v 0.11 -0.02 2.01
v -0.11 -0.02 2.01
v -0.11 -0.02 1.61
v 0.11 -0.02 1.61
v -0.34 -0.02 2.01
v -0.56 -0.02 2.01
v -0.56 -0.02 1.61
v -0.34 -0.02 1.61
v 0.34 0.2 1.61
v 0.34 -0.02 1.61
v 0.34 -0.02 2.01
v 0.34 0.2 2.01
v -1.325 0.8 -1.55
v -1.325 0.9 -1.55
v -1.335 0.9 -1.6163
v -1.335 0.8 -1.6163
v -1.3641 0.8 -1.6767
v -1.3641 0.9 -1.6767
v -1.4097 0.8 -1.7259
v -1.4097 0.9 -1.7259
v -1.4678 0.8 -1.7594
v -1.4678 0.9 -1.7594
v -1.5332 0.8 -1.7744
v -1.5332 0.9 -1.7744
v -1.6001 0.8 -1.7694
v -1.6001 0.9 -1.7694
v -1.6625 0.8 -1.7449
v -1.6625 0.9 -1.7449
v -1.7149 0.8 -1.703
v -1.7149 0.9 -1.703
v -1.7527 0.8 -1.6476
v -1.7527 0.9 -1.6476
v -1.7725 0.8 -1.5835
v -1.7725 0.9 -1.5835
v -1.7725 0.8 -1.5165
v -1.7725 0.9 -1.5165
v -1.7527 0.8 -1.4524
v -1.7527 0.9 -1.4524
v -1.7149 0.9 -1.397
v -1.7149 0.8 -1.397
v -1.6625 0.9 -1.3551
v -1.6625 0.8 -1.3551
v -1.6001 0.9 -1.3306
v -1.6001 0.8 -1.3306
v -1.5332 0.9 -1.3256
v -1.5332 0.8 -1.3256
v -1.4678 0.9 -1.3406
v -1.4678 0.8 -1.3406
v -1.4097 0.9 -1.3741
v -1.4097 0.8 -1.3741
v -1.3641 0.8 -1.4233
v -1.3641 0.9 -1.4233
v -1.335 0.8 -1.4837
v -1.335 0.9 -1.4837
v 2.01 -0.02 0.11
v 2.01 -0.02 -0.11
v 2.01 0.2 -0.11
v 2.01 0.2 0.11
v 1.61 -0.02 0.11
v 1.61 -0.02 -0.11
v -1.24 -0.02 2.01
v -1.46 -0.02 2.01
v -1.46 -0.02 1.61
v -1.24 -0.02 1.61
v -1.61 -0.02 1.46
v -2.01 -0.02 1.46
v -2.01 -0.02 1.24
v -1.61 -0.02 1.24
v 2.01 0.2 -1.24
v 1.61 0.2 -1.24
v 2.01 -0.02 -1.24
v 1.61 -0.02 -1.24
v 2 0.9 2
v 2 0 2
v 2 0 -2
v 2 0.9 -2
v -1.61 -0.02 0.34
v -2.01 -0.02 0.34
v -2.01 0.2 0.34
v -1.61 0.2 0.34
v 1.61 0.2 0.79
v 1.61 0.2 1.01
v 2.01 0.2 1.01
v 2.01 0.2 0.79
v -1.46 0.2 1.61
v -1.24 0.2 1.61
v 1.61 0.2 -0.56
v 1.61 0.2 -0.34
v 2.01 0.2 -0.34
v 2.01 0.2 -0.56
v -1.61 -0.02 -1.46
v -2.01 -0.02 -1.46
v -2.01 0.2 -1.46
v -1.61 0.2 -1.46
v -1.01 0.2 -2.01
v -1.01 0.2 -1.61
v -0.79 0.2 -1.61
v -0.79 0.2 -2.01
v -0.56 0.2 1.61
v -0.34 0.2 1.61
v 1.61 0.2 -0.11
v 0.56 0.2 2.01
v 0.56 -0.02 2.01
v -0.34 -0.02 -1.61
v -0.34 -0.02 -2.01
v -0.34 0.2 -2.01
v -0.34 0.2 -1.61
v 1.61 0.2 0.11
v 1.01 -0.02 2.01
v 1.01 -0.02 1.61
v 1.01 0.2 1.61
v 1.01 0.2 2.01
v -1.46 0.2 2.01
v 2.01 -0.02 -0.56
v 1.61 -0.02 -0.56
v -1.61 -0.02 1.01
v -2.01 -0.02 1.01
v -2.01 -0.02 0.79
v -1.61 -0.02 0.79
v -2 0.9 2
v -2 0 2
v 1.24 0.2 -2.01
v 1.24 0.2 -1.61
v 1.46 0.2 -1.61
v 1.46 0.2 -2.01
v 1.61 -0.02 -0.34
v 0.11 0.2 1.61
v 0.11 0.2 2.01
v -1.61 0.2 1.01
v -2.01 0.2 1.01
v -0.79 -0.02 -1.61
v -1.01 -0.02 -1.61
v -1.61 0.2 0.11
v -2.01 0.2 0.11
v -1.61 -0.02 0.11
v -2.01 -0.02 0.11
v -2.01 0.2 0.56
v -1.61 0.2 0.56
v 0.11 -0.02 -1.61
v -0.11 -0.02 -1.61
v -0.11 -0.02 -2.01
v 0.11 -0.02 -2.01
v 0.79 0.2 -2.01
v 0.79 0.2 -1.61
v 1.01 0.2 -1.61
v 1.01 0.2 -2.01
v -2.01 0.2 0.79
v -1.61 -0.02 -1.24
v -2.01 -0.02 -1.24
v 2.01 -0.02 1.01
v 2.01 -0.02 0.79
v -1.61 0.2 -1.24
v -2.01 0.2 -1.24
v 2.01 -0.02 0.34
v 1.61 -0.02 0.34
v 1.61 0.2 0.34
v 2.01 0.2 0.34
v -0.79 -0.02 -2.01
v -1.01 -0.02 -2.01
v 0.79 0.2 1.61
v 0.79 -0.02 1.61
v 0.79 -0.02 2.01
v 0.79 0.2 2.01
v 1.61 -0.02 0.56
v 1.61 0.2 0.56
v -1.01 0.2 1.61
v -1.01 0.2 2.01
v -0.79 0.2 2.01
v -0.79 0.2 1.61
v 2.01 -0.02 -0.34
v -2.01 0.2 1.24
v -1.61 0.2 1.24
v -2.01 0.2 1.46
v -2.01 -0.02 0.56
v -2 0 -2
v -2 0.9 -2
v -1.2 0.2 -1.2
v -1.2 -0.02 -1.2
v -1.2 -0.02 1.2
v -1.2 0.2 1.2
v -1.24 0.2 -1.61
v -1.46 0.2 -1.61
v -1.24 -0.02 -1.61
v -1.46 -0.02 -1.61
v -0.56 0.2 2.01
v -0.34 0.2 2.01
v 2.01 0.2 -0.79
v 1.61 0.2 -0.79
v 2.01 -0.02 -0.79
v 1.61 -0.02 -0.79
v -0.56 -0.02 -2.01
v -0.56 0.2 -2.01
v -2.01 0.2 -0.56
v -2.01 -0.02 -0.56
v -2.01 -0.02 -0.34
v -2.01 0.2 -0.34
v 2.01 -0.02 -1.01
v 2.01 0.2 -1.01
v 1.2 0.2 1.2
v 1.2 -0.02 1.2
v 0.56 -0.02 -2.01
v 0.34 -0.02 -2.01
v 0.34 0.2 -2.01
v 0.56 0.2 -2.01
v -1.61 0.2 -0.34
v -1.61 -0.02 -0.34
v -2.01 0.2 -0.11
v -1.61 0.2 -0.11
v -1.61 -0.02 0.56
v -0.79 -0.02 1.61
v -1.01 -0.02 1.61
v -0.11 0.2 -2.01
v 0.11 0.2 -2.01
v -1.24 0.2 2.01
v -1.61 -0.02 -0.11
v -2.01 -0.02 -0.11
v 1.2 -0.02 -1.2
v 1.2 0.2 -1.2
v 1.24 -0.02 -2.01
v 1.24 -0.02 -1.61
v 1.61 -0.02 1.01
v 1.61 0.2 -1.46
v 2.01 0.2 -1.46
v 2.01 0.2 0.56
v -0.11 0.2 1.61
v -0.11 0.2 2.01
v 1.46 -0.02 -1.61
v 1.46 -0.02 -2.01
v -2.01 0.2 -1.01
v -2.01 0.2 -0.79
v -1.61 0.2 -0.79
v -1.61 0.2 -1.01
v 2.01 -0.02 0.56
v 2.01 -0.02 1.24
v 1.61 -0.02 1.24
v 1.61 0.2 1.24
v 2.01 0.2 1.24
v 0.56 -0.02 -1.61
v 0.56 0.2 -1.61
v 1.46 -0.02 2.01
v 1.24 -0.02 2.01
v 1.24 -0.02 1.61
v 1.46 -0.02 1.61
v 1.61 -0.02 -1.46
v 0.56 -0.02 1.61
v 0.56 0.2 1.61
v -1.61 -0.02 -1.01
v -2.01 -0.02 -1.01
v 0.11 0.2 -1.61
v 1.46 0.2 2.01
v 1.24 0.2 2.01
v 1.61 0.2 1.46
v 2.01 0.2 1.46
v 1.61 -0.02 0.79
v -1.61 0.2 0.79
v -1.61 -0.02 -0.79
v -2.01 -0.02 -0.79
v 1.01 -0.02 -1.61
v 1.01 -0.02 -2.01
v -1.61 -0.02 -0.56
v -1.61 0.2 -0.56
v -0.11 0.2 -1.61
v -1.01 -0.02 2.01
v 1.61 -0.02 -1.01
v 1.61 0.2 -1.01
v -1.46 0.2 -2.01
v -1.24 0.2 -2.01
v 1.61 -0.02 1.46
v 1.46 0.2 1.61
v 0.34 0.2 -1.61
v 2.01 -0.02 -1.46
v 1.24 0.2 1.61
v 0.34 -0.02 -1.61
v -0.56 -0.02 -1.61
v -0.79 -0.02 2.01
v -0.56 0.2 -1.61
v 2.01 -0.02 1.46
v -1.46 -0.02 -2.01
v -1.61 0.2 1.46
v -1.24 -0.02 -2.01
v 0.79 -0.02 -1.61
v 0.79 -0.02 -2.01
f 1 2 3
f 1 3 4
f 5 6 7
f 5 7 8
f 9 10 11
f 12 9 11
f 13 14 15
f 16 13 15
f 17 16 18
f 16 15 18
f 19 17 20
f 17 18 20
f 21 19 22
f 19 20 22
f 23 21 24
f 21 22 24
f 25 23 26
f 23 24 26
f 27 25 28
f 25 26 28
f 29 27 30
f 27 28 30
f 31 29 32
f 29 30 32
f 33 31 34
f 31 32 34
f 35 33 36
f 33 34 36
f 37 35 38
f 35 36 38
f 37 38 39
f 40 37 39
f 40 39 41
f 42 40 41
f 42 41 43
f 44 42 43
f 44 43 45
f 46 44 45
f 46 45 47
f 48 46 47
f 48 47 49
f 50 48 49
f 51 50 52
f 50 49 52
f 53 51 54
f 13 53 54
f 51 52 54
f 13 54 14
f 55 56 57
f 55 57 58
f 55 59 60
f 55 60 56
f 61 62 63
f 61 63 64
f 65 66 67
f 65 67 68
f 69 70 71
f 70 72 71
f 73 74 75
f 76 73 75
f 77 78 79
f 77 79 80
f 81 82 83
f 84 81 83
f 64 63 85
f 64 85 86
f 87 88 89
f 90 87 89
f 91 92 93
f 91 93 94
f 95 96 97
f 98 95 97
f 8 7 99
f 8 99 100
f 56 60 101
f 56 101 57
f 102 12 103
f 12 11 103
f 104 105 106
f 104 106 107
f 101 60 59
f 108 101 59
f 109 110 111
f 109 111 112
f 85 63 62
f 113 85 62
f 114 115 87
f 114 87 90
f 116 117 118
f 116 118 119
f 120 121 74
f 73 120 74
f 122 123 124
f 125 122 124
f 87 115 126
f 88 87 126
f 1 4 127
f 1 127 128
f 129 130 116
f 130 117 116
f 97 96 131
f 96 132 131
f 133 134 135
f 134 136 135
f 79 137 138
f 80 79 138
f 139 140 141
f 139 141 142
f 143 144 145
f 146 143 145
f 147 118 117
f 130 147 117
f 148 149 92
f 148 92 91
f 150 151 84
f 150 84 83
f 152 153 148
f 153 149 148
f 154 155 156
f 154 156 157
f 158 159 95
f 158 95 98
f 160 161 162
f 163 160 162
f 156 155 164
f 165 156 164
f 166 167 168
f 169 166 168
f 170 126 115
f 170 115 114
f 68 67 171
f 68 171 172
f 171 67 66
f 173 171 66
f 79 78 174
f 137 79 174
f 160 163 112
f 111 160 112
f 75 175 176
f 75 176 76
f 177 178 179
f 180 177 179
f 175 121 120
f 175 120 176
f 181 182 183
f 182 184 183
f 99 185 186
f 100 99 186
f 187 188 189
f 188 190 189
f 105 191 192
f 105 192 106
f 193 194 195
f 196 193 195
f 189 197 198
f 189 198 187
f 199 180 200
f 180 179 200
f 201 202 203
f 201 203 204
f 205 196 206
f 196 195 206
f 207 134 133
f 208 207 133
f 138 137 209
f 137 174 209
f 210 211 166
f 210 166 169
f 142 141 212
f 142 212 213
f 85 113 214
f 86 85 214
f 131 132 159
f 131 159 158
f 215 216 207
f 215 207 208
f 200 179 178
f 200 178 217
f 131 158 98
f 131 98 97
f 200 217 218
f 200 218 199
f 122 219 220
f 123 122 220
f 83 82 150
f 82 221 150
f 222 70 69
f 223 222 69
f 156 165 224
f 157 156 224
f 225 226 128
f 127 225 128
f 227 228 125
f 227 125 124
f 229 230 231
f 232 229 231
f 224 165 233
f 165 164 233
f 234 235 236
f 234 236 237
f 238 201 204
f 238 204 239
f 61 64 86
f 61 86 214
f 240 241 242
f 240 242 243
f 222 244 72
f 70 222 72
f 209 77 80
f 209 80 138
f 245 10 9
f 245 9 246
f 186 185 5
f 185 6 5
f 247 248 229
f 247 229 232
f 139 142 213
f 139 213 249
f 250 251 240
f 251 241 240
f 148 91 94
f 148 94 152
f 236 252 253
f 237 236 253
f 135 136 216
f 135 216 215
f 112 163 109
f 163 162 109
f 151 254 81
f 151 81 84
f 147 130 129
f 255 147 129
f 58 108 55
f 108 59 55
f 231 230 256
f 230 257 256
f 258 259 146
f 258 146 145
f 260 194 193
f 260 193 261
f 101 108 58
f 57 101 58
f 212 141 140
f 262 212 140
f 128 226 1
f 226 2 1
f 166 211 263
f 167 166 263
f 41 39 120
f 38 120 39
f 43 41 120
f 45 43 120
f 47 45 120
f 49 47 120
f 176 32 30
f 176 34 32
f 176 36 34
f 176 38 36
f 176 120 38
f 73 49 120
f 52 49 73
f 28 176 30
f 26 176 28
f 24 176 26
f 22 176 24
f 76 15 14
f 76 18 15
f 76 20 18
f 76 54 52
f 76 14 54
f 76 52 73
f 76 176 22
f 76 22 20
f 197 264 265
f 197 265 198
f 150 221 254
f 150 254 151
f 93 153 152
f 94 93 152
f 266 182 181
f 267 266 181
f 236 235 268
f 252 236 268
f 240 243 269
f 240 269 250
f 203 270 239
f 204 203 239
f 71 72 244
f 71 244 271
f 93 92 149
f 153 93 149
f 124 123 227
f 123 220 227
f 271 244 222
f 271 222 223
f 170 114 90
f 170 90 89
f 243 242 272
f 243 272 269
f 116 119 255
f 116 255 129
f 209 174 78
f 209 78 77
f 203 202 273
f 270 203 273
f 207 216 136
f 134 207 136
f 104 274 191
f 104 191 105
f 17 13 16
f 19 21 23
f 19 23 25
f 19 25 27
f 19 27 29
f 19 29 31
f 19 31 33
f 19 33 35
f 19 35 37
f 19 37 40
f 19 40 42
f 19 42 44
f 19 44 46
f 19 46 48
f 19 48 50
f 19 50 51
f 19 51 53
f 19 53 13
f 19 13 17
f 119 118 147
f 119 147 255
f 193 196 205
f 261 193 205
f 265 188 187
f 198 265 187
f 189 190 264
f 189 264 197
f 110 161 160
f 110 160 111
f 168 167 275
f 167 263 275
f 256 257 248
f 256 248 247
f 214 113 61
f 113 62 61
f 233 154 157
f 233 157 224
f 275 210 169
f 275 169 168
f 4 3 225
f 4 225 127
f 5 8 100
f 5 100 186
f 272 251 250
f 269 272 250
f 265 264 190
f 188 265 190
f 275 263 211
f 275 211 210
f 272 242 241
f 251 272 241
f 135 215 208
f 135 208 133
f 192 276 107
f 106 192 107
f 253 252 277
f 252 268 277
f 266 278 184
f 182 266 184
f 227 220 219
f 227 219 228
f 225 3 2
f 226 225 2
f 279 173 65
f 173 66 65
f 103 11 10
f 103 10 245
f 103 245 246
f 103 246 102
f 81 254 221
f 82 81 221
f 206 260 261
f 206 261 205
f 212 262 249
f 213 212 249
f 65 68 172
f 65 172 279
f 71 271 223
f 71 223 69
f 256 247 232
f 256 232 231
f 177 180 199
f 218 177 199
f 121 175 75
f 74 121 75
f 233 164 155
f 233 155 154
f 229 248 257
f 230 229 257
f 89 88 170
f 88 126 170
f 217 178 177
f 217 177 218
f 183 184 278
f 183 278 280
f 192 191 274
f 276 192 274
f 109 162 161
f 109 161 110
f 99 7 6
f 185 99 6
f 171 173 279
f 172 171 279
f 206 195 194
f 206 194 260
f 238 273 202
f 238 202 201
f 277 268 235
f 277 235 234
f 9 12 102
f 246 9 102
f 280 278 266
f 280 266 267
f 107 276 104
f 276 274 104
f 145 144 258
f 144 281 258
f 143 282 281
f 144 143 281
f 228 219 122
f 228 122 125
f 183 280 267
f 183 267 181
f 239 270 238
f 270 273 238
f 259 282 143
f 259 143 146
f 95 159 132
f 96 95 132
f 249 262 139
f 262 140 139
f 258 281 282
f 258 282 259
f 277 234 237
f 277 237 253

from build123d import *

# Parameters (mm, degrees)
SKETCH2_W                   = 4
SKETCH2_H                   = 4
BOSS_EXTRUDE1_DEPTH         = 0.9
SKETCH3_W                   = 2.4
SKETCH3_H                   = 2.4
BOSS_EXTRUDE2_DEPTH         = 0.02
BOSS_EXTRUDE2_DEPTH_BACK    = 0.2
SKETCH3_W_2                 = 0.4
SKETCH3_H_2                 = 0.22
BOSS_EXTRUDE2_2_DEPTH       = 0.02
BOSS_EXTRUDE2_2_DEPTH_BACK  = 0.2
BOSS_EXTRUDE2_3_DEPTH       = 0.02
BOSS_EXTRUDE2_3_DEPTH_BACK  = 0.2
BOSS_EXTRUDE2_4_DEPTH       = 0.02
BOSS_EXTRUDE2_4_DEPTH_BACK  = 0.2
BOSS_EXTRUDE2_5_DEPTH       = 0.02
BOSS_EXTRUDE2_5_DEPTH_BACK  = 0.2
BOSS_EXTRUDE2_6_DEPTH       = 0.02
BOSS_EXTRUDE2_6_DEPTH_BACK  = 0.2
BOSS_EXTRUDE2_7_DEPTH       = 0.02
BOSS_EXTRUDE2_7_DEPTH_BACK  = 0.2
BOSS_EXTRUDE2_8_DEPTH       = 0.02
BOSS_EXTRUDE2_8_DEPTH_BACK  = 0.2
SKETCH3_W_3                 = 0.22
SKETCH3_H_3                 = 0.4
BOSS_EXTRUDE2_9_DEPTH       = 0.02
BOSS_EXTRUDE2_9_DEPTH_BACK  = 0.2
BOSS_EXTRUDE2_10_DEPTH      = 0.02
BOSS_EXTRUDE2_10_DEPTH_BACK = 0.2
BOSS_EXTRUDE2_11_DEPTH      = 0.02
BOSS_EXTRUDE2_11_DEPTH_BACK = 0.2
BOSS_EXTRUDE2_12_DEPTH      = 0.02
BOSS_EXTRUDE2_12_DEPTH_BACK = 0.2
BOSS_EXTRUDE2_13_DEPTH      = 0.02
BOSS_EXTRUDE2_13_DEPTH_BACK = 0.2
BOSS_EXTRUDE2_14_DEPTH      = 0.02
BOSS_EXTRUDE2_14_DEPTH_BACK = 0.2
BOSS_EXTRUDE2_15_DEPTH      = 0.02
BOSS_EXTRUDE2_15_DEPTH_BACK = 0.2
BOSS_EXTRUDE2_16_DEPTH      = 0.02
BOSS_EXTRUDE2_16_DEPTH_BACK = 0.2
BOSS_EXTRUDE2_17_DEPTH      = 0.02
BOSS_EXTRUDE2_17_DEPTH_BACK = 0.2
BOSS_EXTRUDE2_18_DEPTH      = 0.02
BOSS_EXTRUDE2_18_DEPTH_BACK = 0.2
BOSS_EXTRUDE2_19_DEPTH      = 0.02
BOSS_EXTRUDE2_19_DEPTH_BACK = 0.2
BOSS_EXTRUDE2_20_DEPTH      = 0.02
BOSS_EXTRUDE2_20_DEPTH_BACK = 0.2
BOSS_EXTRUDE2_21_DEPTH      = 0.02
BOSS_EXTRUDE2_21_DEPTH_BACK = 0.2
BOSS_EXTRUDE2_22_DEPTH      = 0.02
BOSS_EXTRUDE2_22_DEPTH_BACK = 0.2
BOSS_EXTRUDE2_23_DEPTH      = 0.02
BOSS_EXTRUDE2_23_DEPTH_BACK = 0.2
BOSS_EXTRUDE2_24_DEPTH      = 0.02
BOSS_EXTRUDE2_24_DEPTH_BACK = 0.2
BOSS_EXTRUDE2_25_DEPTH      = 0.02
BOSS_EXTRUDE2_25_DEPTH_BACK = 0.2
BOSS_EXTRUDE2_26_DEPTH      = 0.02
BOSS_EXTRUDE2_26_DEPTH_BACK = 0.2
BOSS_EXTRUDE2_27_DEPTH      = 0.02
BOSS_EXTRUDE2_27_DEPTH_BACK = 0.2
BOSS_EXTRUDE2_28_DEPTH      = 0.02
BOSS_EXTRUDE2_28_DEPTH_BACK = 0.2
BOSS_EXTRUDE2_29_DEPTH      = 0.02
BOSS_EXTRUDE2_29_DEPTH_BACK = 0.2
SKETCH4_R                   = 0.225
CUT_EXTRUDE1_DEPTH          = 0.1


with BuildPart() as part:
    # Sketch2 → Boss-Extrude1 (new body)
    with BuildSketch(Plane(origin=(0, 0, 0), x_dir=(1, 0, 0), z_dir=(0, 1, 0))):
        Rectangle(SKETCH2_W, SKETCH2_H)
    extrude(amount=BOSS_EXTRUDE1_DEPTH)

    # Sketch4 → Cut-Extrude1 (cut)
    with BuildSketch(Plane(origin=(0, 0.9, 0), x_dir=(1, 0, 0), z_dir=(0, 1, 0))):
        with Locations((-1.55, 1.55)):
            Circle(SKETCH4_R)
    extrude(amount=-CUT_EXTRUDE1_DEPTH, mode=Mode.SUBTRACT)


with BuildPart() as body_2:
    # Sketch3 → Boss-Extrude2 (new body, two sides)
    with BuildSketch(Plane.XZ) as boss_extrude2_sk:
        Rectangle(SKETCH3_W, SKETCH3_H)
    extrude(amount=BOSS_EXTRUDE2_DEPTH)
    extrude(boss_extrude2_sk.sketch, amount=-BOSS_EXTRUDE2_DEPTH_BACK)


with BuildPart() as body_3:
    # Sketch3 → Boss-Extrude2 2 (new body, two sides)
    with BuildSketch(Plane.XZ) as boss_extrude2_2_sk:
        with Locations((-1.81, 0.45)):
            Rectangle(SKETCH3_W_2, SKETCH3_H_2)
    extrude(amount=BOSS_EXTRUDE2_2_DEPTH)
    extrude(boss_extrude2_2_sk.sketch, amount=-BOSS_EXTRUDE2_2_DEPTH_BACK)


with BuildPart() as body_4:
    # Sketch3 → Boss-Extrude2 3 (new body, two sides)
    with BuildSketch(Plane.XZ) as boss_extrude2_3_sk:
        with Locations((-1.81, 0)):
            Rectangle(SKETCH3_W_2, SKETCH3_H_2)
    extrude(amount=BOSS_EXTRUDE2_3_DEPTH)
    extrude(boss_extrude2_3_sk.sketch, amount=-BOSS_EXTRUDE2_3_DEPTH_BACK)


with BuildPart() as body_5:
    # Sketch3 → Boss-Extrude2 4 (new body, two sides)
    with BuildSketch(Plane.XZ) as boss_extrude2_4_sk:
        with Locations((-1.81, 0.9)):
            Rectangle(SKETCH3_W_2, SKETCH3_H_2)
    extrude(amount=BOSS_EXTRUDE2_4_DEPTH)
    extrude(boss_extrude2_4_sk.sketch, amount=-BOSS_EXTRUDE2_4_DEPTH_BACK)


with BuildPart() as body_6:
    # Sketch3 → Boss-Extrude2 5 (new body, two sides)
    with BuildSketch(Plane.XZ) as boss_extrude2_5_sk:
        with Locations((-1.81, 1.35)):
            Rectangle(SKETCH3_W_2, SKETCH3_H_2)
    extrude(amount=BOSS_EXTRUDE2_5_DEPTH)
    extrude(boss_extrude2_5_sk.sketch, amount=-BOSS_EXTRUDE2_5_DEPTH_BACK)


with BuildPart() as body_7:
    # Sketch3 → Boss-Extrude2 6 (new body, two sides)
    with BuildSketch(Plane.XZ) as boss_extrude2_6_sk:
        with Locations((-1.81, -0.45)):
            Rectangle(SKETCH3_W_2, SKETCH3_H_2)
    extrude(amount=BOSS_EXTRUDE2_6_DEPTH)
    extrude(boss_extrude2_6_sk.sketch, amount=-BOSS_EXTRUDE2_6_DEPTH_BACK)


with BuildPart() as body_8:
    # Sketch3 → Boss-Extrude2 7 (new body, two sides)
    with BuildSketch(Plane.XZ) as boss_extrude2_7_sk:
        with Locations((-1.81, -0.9)):
            Rectangle(SKETCH3_W_2, SKETCH3_H_2)
    extrude(amount=BOSS_EXTRUDE2_7_DEPTH)
    extrude(boss_extrude2_7_sk.sketch, amount=-BOSS_EXTRUDE2_7_DEPTH_BACK)


with BuildPart() as body_9:
    # Sketch3 → Boss-Extrude2 8 (new body, two sides)
    with BuildSketch(Plane.XZ) as boss_extrude2_8_sk:
        with Locations((-1.81, -1.35)):
            Rectangle(SKETCH3_W_2, SKETCH3_H_2)
    extrude(amount=BOSS_EXTRUDE2_8_DEPTH)
    extrude(boss_extrude2_8_sk.sketch, amount=-BOSS_EXTRUDE2_8_DEPTH_BACK)


with BuildPart() as body_10:
    # Sketch3 → Boss-Extrude2 9 (new body, two sides)
    with BuildSketch(Plane.XZ) as boss_extrude2_9_sk:
        with Locations((0.45, 1.81)):
            Rectangle(SKETCH3_W_3, SKETCH3_H_3)
    extrude(amount=BOSS_EXTRUDE2_9_DEPTH)
    extrude(boss_extrude2_9_sk.sketch, amount=-BOSS_EXTRUDE2_9_DEPTH_BACK)


with BuildPart() as body_11:
    # Sketch3 → Boss-Extrude2 10 (new body, two sides)
    with BuildSketch(Plane.XZ) as boss_extrude2_10_sk:
        with Locations((0, 1.81)):
            Rectangle(SKETCH3_W_3, SKETCH3_H_3)
    extrude(amount=BOSS_EXTRUDE2_10_DEPTH)
    extrude(boss_extrude2_10_sk.sketch, amount=-BOSS_EXTRUDE2_10_DEPTH_BACK)


with BuildPart() as body_12:
    # Sketch3 → Boss-Extrude2 11 (new body, two sides)
    with BuildSketch(Plane.XZ) as boss_extrude2_11_sk:
        with Locations((0.9, 1.81)):
            Rectangle(SKETCH3_W_3, SKETCH3_H_3)
    extrude(amount=BOSS_EXTRUDE2_11_DEPTH)
    extrude(boss_extrude2_11_sk.sketch, amount=-BOSS_EXTRUDE2_11_DEPTH_BACK)


with BuildPart() as body_13:
    # Sketch3 → Boss-Extrude2 12 (new body, two sides)
    with BuildSketch(Plane.XZ) as boss_extrude2_12_sk:
        with Locations((1.35, 1.81)):
            Rectangle(SKETCH3_W_3, SKETCH3_H_3)
    extrude(amount=BOSS_EXTRUDE2_12_DEPTH)
    extrude(boss_extrude2_12_sk.sketch, amount=-BOSS_EXTRUDE2_12_DEPTH_BACK)


with BuildPart() as body_14:
    # Sketch3 → Boss-Extrude2 13 (new body, two sides)
    with BuildSketch(Plane.XZ) as boss_extrude2_13_sk:
        with Locations((-0.45, 1.81)):
            Rectangle(SKETCH3_W_3, SKETCH3_H_3)
    extrude(amount=BOSS_EXTRUDE2_13_DEPTH)
    extrude(boss_extrude2_13_sk.sketch, amount=-BOSS_EXTRUDE2_13_DEPTH_BACK)


with BuildPart() as body_15:
    # Sketch3 → Boss-Extrude2 14 (new body, two sides)
    with BuildSketch(Plane.XZ) as boss_extrude2_14_sk:
        with Locations((-0.9, 1.81)):
            Rectangle(SKETCH3_W_3, SKETCH3_H_3)
    extrude(amount=BOSS_EXTRUDE2_14_DEPTH)
    extrude(boss_extrude2_14_sk.sketch, amount=-BOSS_EXTRUDE2_14_DEPTH_BACK)


with BuildPart() as body_16:
    # Sketch3 → Boss-Extrude2 15 (new body, two sides)
    with BuildSketch(Plane.XZ) as boss_extrude2_15_sk:
        with Locations((-1.35, 1.81)):
            Rectangle(SKETCH3_W_3, SKETCH3_H_3)
    extrude(amount=BOSS_EXTRUDE2_15_DEPTH)
    extrude(boss_extrude2_15_sk.sketch, amount=-BOSS_EXTRUDE2_15_DEPTH_BACK)


with BuildPart() as body_17:
    # Sketch3 → Boss-Extrude2 16 (new body, two sides)
    with BuildSketch(Plane.XZ) as boss_extrude2_16_sk:
        with Locations((1.81, -0.45)):
            Rectangle(SKETCH3_W_2, SKETCH3_H_2)
    extrude(amount=BOSS_EXTRUDE2_16_DEPTH)
    extrude(boss_extrude2_16_sk.sketch, amount=-BOSS_EXTRUDE2_16_DEPTH_BACK)


with BuildPart() as body_18:
    # Sketch3 → Boss-Extrude2 17 (new body, two sides)
    with BuildSketch(Plane.XZ) as boss_extrude2_17_sk:
        with Locations((1.81, 0)):
            Rectangle(SKETCH3_W_2, SKETCH3_H_2)
    extrude(amount=BOSS_EXTRUDE2_17_DEPTH)
    extrude(boss_extrude2_17_sk.sketch, amount=-BOSS_EXTRUDE2_17_DEPTH_BACK)


with BuildPart() as body_19:
    # Sketch3 → Boss-Extrude2 18 (new body, two sides)
    with BuildSketch(Plane.XZ) as boss_extrude2_18_sk:
        with Locations((1.81, -0.9)):
            Rectangle(SKETCH3_W_2, SKETCH3_H_2)
    extrude(amount=BOSS_EXTRUDE2_18_DEPTH)
    extrude(boss_extrude2_18_sk.sketch, amount=-BOSS_EXTRUDE2_18_DEPTH_BACK)


with BuildPart() as body_20:
    # Sketch3 → Boss-Extrude2 19 (new body, two sides)
    with BuildSketch(Plane.XZ) as boss_extrude2_19_sk:
        with Locations((1.81, -1.35)):
            Rectangle(SKETCH3_W_2, SKETCH3_H_2)
    extrude(amount=BOSS_EXTRUDE2_19_DEPTH)
    extrude(boss_extrude2_19_sk.sketch, amount=-BOSS_EXTRUDE2_19_DEPTH_BACK)


with BuildPart() as body_21:
    # Sketch3 → Boss-Extrude2 20 (new body, two sides)
    with BuildSketch(Plane.XZ) as boss_extrude2_20_sk:
        with Locations((1.81, 0.45)):
            Rectangle(SKETCH3_W_2, SKETCH3_H_2)
    extrude(amount=BOSS_EXTRUDE2_20_DEPTH)
    extrude(boss_extrude2_20_sk.sketch, amount=-BOSS_EXTRUDE2_20_DEPTH_BACK)


with BuildPart() as body_22:
    # Sketch3 → Boss-Extrude2 21 (new body, two sides)
    with BuildSketch(Plane.XZ) as boss_extrude2_21_sk:
        with Locations((1.81, 0.9)):
            Rectangle(SKETCH3_W_2, SKETCH3_H_2)
    extrude(amount=BOSS_EXTRUDE2_21_DEPTH)
    extrude(boss_extrude2_21_sk.sketch, amount=-BOSS_EXTRUDE2_21_DEPTH_BACK)


with BuildPart() as body_23:
    # Sketch3 → Boss-Extrude2 22 (new body, two sides)
    with BuildSketch(Plane.XZ) as boss_extrude2_22_sk:
        with Locations((1.81, 1.35)):
            Rectangle(SKETCH3_W_2, SKETCH3_H_2)
    extrude(amount=BOSS_EXTRUDE2_22_DEPTH)
    extrude(boss_extrude2_22_sk.sketch, amount=-BOSS_EXTRUDE2_22_DEPTH_BACK)


with BuildPart() as body_24:
    # Sketch3 → Boss-Extrude2 23 (new body, two sides)
    with BuildSketch(Plane.XZ) as boss_extrude2_23_sk:
        with Locations((-0.45, -1.81)):
            Rectangle(SKETCH3_W_3, SKETCH3_H_3)
    extrude(amount=BOSS_EXTRUDE2_23_DEPTH)
    extrude(boss_extrude2_23_sk.sketch, amount=-BOSS_EXTRUDE2_23_DEPTH_BACK)


with BuildPart() as body_25:
    # Sketch3 → Boss-Extrude2 24 (new body, two sides)
    with BuildSketch(Plane.XZ) as boss_extrude2_24_sk:
        with Locations((0, -1.81)):
            Rectangle(SKETCH3_W_3, SKETCH3_H_3)
    extrude(amount=BOSS_EXTRUDE2_24_DEPTH)
    extrude(boss_extrude2_24_sk.sketch, amount=-BOSS_EXTRUDE2_24_DEPTH_BACK)


with BuildPart() as body_26:
    # Sketch3 → Boss-Extrude2 25 (new body, two sides)
    with BuildSketch(Plane.XZ) as boss_extrude2_25_sk:
        with Locations((-0.9, -1.81)):
            Rectangle(SKETCH3_W_3, SKETCH3_H_3)
    extrude(amount=BOSS_EXTRUDE2_25_DEPTH)
    extrude(boss_extrude2_25_sk.sketch, amount=-BOSS_EXTRUDE2_25_DEPTH_BACK)


with BuildPart() as body_27:
    # Sketch3 → Boss-Extrude2 26 (new body, two sides)
    with BuildSketch(Plane.XZ) as boss_extrude2_26_sk:
        with Locations((-1.35, -1.81)):
            Rectangle(SKETCH3_W_3, SKETCH3_H_3)
    extrude(amount=BOSS_EXTRUDE2_26_DEPTH)
    extrude(boss_extrude2_26_sk.sketch, amount=-BOSS_EXTRUDE2_26_DEPTH_BACK)


with BuildPart() as body_28:
    # Sketch3 → Boss-Extrude2 27 (new body, two sides)
    with BuildSketch(Plane.XZ) as boss_extrude2_27_sk:
        with Locations((0.45, -1.81)):
            Rectangle(SKETCH3_W_3, SKETCH3_H_3)
    extrude(amount=BOSS_EXTRUDE2_27_DEPTH)
    extrude(boss_extrude2_27_sk.sketch, amount=-BOSS_EXTRUDE2_27_DEPTH_BACK)


with BuildPart() as body_29:
    # Sketch3 → Boss-Extrude2 28 (new body, two sides)
    with BuildSketch(Plane.XZ) as boss_extrude2_28_sk:
        with Locations((0.9, -1.81)):
            Rectangle(SKETCH3_W_3, SKETCH3_H_3)
    extrude(amount=BOSS_EXTRUDE2_28_DEPTH)
    extrude(boss_extrude2_28_sk.sketch, amount=-BOSS_EXTRUDE2_28_DEPTH_BACK)


with BuildPart() as body_30:
    # Sketch3 → Boss-Extrude2 29 (new body, two sides)
    with BuildSketch(Plane.XZ) as boss_extrude2_29_sk:
        with Locations((1.35, -1.81)):
            Rectangle(SKETCH3_W_3, SKETCH3_H_3)
    extrude(amount=BOSS_EXTRUDE2_29_DEPTH)
    extrude(boss_extrude2_29_sk.sketch, amount=-BOSS_EXTRUDE2_29_DEPTH_BACK)


solid = Compound([part.part, body_2.part, body_3.part, body_4.part, body_5.part, body_6.part, body_7.part, body_8.part, body_9.part, body_10.part, body_11.part, body_12.part, body_13.part, body_14.part, body_15.part, body_16.part, body_17.part, body_18.part, body_19.part, body_20.part, body_21.part, body_22.part, body_23.part, body_24.part, body_25.part, body_26.part, body_27.part, body_28.part, body_29.part, body_30.part])
